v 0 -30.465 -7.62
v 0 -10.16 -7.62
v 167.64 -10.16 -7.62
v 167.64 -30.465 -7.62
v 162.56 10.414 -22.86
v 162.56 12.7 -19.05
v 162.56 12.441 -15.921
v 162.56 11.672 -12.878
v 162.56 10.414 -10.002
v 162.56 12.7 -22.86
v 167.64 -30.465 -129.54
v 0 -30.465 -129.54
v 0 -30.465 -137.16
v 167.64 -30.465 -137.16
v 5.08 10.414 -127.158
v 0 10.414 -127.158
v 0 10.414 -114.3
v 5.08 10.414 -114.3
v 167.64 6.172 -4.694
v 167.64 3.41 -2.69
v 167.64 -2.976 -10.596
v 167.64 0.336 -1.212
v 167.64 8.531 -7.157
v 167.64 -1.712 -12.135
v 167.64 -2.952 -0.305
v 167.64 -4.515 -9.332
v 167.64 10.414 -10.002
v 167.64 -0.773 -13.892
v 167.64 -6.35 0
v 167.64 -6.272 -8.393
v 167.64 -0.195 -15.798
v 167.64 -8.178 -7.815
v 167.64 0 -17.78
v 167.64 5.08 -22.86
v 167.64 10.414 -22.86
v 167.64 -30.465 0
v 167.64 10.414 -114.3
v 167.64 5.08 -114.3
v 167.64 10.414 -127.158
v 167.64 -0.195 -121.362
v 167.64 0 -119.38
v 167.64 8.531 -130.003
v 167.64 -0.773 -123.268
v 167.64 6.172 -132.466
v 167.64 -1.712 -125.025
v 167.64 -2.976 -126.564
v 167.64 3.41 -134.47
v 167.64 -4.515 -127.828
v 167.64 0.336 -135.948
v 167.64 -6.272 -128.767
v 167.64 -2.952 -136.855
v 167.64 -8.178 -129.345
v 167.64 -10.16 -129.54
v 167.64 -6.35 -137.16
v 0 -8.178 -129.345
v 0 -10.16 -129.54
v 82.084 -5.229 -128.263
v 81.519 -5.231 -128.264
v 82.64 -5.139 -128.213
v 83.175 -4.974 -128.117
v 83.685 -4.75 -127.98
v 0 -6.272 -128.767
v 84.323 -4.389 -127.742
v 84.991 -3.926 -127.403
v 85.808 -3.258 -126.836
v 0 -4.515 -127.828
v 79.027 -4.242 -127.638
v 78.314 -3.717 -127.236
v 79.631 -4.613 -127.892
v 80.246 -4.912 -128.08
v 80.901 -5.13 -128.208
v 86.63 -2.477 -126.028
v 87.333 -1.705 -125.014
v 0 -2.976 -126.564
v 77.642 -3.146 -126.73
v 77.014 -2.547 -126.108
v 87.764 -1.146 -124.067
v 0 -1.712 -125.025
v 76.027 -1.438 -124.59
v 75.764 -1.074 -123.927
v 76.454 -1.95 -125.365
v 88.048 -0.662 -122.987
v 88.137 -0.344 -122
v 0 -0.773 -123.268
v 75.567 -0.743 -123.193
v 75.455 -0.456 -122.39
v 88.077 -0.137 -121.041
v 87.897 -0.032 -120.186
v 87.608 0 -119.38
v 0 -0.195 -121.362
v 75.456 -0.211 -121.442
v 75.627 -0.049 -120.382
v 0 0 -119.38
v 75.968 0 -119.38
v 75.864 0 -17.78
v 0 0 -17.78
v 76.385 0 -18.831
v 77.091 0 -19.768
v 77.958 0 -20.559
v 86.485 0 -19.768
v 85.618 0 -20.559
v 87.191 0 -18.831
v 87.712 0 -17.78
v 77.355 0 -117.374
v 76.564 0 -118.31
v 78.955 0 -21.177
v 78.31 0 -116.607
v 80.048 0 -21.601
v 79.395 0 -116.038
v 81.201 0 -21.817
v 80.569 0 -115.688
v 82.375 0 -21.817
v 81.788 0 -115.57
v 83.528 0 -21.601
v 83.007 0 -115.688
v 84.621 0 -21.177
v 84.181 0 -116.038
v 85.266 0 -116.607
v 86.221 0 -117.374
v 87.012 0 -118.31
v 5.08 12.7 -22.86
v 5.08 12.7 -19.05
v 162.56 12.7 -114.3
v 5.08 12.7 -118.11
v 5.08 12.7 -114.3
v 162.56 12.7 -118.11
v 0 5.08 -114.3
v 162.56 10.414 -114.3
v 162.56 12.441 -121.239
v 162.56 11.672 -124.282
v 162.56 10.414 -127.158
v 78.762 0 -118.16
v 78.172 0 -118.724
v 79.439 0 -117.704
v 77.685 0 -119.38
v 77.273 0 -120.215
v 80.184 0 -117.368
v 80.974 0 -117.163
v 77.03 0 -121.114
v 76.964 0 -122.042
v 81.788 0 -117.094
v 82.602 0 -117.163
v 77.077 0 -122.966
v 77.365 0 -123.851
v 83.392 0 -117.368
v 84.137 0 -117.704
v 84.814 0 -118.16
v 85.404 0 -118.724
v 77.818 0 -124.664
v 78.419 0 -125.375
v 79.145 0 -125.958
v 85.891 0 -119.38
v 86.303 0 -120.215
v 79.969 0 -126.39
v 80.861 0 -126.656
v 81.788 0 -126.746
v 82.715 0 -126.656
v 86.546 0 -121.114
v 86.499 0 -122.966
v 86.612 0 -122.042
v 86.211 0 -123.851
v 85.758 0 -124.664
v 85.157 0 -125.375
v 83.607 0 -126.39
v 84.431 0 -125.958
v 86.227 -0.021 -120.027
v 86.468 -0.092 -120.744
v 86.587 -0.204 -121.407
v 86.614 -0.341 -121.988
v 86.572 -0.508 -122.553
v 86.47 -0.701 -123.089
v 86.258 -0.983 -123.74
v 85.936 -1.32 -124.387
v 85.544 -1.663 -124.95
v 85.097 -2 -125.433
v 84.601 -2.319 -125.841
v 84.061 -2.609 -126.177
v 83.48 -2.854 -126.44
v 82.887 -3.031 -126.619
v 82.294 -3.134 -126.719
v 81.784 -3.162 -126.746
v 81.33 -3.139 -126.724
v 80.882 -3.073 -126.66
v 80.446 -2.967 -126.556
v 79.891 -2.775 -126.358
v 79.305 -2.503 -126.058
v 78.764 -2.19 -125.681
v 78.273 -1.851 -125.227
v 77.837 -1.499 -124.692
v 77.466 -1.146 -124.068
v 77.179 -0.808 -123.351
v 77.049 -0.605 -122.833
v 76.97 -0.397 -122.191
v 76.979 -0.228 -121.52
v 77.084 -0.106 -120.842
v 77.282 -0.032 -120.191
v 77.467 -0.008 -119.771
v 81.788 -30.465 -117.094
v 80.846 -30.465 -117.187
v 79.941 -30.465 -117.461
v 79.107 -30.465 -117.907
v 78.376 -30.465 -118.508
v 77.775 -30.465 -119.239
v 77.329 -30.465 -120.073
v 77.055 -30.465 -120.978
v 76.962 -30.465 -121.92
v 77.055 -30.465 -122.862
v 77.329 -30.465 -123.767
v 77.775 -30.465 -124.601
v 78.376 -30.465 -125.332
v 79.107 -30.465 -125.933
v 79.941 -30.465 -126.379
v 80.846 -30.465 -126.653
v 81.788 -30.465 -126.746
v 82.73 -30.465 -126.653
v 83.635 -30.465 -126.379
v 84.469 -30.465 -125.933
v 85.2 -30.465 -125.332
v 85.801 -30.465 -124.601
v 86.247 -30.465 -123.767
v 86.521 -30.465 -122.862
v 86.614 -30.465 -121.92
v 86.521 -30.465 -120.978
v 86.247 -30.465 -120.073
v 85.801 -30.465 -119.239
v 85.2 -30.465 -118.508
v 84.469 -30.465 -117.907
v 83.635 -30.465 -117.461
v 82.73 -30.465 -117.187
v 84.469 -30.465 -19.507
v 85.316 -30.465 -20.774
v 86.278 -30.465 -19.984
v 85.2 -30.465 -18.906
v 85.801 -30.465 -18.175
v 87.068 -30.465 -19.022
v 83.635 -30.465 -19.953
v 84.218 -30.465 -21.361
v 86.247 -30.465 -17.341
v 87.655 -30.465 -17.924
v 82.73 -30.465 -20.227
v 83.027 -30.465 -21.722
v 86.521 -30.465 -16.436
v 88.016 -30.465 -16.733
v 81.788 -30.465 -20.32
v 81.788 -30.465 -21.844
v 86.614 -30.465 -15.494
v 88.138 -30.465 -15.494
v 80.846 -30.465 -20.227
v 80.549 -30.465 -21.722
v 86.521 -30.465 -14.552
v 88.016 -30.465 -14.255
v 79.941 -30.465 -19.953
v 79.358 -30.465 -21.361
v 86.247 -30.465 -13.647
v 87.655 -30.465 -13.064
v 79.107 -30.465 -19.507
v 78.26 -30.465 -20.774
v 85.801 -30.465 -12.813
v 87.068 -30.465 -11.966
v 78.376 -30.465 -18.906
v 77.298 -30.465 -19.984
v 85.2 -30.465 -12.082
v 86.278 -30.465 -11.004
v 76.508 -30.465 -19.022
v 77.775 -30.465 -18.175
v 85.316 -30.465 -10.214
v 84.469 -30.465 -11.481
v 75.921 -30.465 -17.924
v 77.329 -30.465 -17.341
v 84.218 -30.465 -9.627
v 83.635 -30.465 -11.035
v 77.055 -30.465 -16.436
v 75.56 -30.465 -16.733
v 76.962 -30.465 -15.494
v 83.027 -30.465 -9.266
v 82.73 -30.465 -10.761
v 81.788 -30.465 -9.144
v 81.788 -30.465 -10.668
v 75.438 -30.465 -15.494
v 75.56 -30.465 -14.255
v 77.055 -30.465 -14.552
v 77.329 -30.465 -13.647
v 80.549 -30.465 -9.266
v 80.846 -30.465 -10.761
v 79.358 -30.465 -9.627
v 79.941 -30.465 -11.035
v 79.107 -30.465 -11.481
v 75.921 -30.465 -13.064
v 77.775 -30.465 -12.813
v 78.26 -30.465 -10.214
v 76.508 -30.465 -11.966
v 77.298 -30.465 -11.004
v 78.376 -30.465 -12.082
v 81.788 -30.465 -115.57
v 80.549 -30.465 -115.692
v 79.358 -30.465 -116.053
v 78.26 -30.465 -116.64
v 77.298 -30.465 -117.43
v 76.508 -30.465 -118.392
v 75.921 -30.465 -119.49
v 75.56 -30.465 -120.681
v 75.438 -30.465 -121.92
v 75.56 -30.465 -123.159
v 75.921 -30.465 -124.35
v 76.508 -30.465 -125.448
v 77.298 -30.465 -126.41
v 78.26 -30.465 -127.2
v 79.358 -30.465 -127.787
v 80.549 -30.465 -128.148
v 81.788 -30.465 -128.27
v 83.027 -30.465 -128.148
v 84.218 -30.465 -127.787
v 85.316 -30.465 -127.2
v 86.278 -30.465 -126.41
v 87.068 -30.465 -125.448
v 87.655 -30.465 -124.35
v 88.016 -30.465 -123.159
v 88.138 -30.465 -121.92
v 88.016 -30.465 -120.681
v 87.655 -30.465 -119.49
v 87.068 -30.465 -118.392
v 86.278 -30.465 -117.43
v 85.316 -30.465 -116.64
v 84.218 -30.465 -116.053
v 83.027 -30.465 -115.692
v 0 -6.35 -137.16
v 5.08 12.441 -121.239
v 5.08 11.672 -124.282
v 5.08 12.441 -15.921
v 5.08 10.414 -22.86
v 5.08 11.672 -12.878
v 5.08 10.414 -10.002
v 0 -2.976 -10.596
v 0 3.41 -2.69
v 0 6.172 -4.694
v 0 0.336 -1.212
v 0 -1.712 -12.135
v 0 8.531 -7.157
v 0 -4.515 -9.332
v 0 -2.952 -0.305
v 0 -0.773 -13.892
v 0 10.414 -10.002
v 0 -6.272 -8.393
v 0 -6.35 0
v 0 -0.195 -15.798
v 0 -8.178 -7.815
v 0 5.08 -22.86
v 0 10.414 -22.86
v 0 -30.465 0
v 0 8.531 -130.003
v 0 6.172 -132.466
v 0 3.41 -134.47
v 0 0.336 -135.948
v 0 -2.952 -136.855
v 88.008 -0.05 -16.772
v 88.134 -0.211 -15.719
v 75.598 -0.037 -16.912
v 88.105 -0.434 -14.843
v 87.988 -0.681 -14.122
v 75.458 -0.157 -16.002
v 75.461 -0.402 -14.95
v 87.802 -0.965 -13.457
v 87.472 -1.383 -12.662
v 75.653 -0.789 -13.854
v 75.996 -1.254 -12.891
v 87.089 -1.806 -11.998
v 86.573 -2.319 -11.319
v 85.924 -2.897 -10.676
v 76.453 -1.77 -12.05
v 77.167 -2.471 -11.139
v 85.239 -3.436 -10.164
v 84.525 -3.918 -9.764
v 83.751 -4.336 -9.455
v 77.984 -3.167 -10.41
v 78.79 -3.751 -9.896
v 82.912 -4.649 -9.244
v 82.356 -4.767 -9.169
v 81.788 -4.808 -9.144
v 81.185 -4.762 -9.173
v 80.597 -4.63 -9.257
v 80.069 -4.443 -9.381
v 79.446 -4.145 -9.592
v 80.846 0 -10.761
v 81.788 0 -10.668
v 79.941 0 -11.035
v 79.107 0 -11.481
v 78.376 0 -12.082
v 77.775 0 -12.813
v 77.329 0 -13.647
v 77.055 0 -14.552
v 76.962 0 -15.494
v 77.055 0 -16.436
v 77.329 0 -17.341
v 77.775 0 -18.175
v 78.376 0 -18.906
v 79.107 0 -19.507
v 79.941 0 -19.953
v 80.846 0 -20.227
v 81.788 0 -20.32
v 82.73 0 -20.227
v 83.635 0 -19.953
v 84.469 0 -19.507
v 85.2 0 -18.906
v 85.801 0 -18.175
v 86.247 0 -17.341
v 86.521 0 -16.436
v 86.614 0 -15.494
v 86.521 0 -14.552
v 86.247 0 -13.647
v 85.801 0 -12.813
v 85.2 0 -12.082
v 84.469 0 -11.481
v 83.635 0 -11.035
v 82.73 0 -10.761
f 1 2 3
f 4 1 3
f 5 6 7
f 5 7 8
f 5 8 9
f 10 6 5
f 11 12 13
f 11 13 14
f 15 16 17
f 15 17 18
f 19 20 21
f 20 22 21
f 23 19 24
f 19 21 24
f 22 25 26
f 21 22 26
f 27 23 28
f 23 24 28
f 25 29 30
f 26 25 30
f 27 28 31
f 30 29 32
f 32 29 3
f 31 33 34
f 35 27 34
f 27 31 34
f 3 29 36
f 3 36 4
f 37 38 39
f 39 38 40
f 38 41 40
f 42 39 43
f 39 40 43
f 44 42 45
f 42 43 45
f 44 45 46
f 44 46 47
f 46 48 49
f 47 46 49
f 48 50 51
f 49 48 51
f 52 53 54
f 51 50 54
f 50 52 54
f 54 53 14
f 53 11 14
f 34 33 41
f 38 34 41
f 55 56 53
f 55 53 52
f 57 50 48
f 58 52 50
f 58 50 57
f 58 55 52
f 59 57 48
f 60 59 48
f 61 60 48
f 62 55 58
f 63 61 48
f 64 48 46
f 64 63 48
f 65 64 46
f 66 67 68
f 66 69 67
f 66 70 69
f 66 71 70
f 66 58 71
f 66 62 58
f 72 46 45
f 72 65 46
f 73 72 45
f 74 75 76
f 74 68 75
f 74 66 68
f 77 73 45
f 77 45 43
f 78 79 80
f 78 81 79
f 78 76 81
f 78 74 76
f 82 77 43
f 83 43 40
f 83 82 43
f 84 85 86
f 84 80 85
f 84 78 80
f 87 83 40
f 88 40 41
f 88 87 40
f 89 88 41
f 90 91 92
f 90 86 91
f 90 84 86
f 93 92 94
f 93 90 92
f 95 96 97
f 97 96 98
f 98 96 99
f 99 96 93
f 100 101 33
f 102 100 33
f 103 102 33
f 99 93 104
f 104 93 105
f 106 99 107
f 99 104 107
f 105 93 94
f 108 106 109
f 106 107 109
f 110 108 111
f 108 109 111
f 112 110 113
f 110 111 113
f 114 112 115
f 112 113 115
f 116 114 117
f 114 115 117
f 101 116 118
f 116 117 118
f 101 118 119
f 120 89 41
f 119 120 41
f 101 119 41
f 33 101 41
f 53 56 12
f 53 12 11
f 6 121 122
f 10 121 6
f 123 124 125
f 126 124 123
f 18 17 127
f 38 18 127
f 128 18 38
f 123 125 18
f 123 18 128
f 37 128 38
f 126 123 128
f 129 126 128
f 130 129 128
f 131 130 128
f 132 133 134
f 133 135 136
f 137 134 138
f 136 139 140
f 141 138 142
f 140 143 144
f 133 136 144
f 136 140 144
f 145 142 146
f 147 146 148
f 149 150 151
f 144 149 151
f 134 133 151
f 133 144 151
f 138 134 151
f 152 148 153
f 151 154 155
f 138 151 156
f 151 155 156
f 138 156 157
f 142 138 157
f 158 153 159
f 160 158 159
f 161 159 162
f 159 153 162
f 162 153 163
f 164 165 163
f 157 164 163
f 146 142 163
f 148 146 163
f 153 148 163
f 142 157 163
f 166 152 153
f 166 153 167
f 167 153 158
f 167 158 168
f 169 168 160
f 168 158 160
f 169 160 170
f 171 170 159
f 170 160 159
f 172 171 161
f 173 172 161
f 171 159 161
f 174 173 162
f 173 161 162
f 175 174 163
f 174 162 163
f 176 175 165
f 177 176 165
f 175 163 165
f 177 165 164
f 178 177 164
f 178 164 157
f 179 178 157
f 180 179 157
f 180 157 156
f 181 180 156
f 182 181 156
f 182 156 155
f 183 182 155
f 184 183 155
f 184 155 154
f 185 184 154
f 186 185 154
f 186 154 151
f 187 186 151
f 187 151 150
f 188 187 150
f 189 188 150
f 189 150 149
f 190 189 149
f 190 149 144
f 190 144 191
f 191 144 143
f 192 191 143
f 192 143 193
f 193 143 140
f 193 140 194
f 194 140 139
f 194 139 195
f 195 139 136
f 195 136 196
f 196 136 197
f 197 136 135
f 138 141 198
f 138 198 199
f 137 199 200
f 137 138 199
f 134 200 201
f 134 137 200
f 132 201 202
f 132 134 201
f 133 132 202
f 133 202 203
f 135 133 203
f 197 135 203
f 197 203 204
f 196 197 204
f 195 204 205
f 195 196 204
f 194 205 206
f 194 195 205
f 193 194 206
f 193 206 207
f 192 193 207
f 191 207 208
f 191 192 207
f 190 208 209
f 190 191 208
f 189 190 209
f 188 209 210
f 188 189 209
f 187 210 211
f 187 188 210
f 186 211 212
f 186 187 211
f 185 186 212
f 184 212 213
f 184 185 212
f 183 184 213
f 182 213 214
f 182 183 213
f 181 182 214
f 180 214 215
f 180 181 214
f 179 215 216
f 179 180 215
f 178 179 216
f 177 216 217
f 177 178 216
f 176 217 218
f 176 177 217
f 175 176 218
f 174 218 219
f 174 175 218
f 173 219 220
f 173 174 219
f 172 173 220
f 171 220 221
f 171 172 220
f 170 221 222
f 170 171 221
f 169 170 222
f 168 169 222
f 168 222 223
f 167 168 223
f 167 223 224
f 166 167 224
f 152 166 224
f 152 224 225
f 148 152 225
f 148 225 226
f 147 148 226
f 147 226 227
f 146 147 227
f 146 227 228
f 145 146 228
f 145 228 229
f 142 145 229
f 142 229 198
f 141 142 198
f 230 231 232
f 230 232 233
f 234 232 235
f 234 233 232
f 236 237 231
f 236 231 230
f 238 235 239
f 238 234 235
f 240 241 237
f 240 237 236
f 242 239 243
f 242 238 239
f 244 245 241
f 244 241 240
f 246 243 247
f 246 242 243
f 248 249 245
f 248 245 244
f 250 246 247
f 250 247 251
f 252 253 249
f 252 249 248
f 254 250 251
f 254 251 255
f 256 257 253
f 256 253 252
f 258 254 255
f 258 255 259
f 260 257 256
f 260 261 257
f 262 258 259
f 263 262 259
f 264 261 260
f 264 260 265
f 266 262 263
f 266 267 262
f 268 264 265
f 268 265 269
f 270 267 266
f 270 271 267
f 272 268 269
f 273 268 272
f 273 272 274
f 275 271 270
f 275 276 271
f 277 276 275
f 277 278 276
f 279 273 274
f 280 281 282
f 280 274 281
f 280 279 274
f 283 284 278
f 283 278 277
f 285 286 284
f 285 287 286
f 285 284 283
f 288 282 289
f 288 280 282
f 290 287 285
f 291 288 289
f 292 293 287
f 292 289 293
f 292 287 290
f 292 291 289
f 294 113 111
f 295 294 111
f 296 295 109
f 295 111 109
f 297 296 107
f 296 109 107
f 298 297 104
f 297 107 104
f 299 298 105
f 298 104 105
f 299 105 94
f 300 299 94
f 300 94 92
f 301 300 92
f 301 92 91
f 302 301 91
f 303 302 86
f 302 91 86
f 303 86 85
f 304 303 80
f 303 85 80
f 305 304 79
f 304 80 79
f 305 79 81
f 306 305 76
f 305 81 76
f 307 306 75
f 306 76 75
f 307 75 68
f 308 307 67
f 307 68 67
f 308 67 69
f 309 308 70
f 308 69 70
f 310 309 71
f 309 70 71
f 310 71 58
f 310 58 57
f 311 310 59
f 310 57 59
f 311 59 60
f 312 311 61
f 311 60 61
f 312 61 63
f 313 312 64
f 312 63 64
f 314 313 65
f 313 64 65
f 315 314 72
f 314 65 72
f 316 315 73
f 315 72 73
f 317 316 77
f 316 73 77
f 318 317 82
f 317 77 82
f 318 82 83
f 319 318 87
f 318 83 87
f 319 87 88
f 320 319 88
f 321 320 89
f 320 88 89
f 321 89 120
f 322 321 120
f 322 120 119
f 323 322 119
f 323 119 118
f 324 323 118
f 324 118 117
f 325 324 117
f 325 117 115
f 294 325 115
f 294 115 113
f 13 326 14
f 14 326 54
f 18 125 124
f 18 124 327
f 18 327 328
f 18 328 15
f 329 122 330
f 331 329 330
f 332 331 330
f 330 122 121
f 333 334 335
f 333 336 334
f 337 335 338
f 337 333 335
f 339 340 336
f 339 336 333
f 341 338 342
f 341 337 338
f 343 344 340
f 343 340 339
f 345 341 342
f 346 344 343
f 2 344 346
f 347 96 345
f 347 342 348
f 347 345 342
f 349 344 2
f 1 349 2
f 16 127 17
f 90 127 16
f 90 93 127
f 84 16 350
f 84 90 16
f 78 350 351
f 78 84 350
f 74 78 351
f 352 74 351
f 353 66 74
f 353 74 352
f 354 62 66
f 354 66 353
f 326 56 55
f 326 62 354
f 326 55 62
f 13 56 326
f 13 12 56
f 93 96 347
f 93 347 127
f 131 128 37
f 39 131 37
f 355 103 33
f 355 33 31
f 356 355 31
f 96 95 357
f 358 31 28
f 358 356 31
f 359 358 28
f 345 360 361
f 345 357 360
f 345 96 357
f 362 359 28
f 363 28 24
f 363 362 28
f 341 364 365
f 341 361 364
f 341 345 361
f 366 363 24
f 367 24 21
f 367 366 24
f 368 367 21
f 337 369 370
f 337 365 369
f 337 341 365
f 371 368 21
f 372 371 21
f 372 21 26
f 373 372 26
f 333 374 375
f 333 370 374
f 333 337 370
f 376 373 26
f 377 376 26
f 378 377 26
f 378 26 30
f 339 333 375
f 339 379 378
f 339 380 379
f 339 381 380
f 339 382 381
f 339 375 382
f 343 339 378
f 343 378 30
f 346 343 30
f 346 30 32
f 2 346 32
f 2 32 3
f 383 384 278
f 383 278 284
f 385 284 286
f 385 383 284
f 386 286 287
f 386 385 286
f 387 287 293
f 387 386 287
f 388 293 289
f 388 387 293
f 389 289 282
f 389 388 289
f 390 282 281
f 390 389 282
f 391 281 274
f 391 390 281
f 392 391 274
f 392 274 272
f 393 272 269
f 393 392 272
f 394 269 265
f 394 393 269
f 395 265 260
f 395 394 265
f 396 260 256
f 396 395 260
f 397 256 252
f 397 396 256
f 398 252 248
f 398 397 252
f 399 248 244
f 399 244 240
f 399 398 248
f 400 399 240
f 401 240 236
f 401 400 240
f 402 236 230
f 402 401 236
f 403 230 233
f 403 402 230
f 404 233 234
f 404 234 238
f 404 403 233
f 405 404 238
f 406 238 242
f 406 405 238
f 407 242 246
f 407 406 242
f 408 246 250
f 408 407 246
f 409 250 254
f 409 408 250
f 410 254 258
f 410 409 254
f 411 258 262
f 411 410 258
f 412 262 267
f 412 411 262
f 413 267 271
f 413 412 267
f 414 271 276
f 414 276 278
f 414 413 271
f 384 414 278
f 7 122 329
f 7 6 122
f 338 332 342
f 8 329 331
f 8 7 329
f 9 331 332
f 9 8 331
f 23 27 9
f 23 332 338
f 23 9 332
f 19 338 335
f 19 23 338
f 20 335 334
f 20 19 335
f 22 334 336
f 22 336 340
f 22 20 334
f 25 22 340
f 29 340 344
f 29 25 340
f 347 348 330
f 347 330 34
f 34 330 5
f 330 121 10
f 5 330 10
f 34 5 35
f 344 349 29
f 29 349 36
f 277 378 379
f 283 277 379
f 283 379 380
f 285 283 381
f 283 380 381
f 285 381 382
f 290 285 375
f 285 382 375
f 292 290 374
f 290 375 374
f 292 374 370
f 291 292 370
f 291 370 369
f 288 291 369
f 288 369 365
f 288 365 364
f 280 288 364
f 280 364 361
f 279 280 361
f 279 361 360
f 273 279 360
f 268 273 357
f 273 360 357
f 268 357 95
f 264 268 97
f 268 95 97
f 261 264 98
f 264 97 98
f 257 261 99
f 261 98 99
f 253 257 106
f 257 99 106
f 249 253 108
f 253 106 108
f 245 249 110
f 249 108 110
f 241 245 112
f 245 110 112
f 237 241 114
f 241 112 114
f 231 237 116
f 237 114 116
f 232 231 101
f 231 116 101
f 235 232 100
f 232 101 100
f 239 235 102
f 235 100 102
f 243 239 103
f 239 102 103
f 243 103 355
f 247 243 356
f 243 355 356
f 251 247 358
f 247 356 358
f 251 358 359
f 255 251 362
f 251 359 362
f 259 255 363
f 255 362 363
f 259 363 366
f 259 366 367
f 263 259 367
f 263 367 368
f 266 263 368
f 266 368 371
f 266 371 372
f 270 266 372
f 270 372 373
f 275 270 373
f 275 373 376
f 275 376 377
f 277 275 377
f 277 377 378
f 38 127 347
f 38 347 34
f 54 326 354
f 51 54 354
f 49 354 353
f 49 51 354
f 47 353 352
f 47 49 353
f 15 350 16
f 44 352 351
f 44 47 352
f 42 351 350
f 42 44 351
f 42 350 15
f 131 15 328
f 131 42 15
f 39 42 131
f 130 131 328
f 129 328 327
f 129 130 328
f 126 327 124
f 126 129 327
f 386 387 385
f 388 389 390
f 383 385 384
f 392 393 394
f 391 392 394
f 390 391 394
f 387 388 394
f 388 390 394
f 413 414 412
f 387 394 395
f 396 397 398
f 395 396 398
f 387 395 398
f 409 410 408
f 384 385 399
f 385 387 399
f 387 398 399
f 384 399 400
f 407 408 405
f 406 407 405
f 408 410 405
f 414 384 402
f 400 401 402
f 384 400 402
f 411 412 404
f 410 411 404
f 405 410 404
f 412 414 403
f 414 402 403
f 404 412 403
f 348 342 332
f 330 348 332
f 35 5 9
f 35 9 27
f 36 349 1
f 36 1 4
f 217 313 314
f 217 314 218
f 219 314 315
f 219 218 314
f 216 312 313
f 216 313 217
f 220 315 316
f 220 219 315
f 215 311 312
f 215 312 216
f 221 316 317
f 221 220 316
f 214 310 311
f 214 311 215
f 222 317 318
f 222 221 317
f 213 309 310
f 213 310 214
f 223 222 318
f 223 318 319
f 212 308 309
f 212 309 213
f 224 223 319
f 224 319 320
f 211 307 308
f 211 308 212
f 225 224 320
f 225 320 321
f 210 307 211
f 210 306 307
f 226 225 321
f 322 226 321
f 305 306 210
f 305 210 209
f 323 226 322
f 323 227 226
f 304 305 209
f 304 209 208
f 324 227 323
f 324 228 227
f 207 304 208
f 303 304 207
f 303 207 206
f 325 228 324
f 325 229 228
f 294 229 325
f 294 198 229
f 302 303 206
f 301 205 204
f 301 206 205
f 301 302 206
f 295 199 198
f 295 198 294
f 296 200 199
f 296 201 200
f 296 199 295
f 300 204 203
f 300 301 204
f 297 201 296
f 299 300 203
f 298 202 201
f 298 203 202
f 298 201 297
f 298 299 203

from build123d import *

# Parameters (mm, degrees)
SKETCH1_W           = 167.64
SKETCH1_H           = 137.16
BOSS_EXTRUDE1_DEPTH = 12.7
SKETCH2_W           = 167.64
SKETCH2_H           = 91.44
CUT_EXTRUDE1_DEPTH  = 7.62
SKETCH3_W           = 5.08
SKETCH3_H           = 22.86
CUT_EXTRUDE2_DEPTH  = 2.286
SKETCH4_R           = 6.35
SKETCH4_R_2         = 4.826
BOSS_EXTRUDE2_DEPTH = 30.464799878
SKETCH5_W           = 167.64
SKETCH5_H           = 7.62
BOSS_EXTRUDE3_DEPTH = 30.464799878
FILLET1_R           = 19.05
FILLET2_R           = 10.16


with BuildPart() as part:
    # Sketch1 → Boss-Extrude1 (new body)
    with BuildSketch(Plane(origin=(0, 0, 0), x_dir=(1, 0, 0), z_dir=(0, 1, 0))):
        with Locations((83.82, 68.58)):
            Rectangle(SKETCH1_W, SKETCH1_H)
    extrude(amount=BOSS_EXTRUDE1_DEPTH)

    # Sketch2 → Cut-Extrude1 (cut)
    with BuildSketch(Plane(origin=(0, 12.7, 0), x_dir=(1, 0, 0), z_dir=(0, 1, 0))):
        with Locations((83.82, 68.58)):
            Rectangle(SKETCH2_W, SKETCH2_H)
    extrude(amount=-CUT_EXTRUDE1_DEPTH, mode=Mode.SUBTRACT)

    # Sketch3 → Cut-Extrude2 (cut)
    with BuildSketch(Plane(origin=(0, 12.7, 0), x_dir=(1, 0, 0), z_dir=(0, 1, 0))):
        with Locations((2.54, 125.73)):
            Rectangle(SKETCH3_W, SKETCH3_H)
        with Locations((165.1, 125.73)):
            Rectangle(SKETCH3_W, SKETCH3_H)
        with Locations((165.1, 11.43)):
            Rectangle(SKETCH3_W, SKETCH3_H)
        with Locations((2.54, 11.43)):
            Rectangle(SKETCH3_W, SKETCH3_H)
    extrude(amount=-CUT_EXTRUDE2_DEPTH, mode=Mode.SUBTRACT)

    # Sketch4 → Boss-Extrude2 (add)
    # profile 1 of 2: a face of its own
    with BuildSketch(Plane.XZ):
        with Locations(Location((81.788, -15.494, 0), (0, 0, 90))):
            Circle(SKETCH4_R)
        with Locations(Location((81.788, -15.494, 0), (0, 0, 90))):
            Circle(SKETCH4_R_2, mode=Mode.SUBTRACT)
    # profile 2 of 2: a face of its own
    with BuildSketch(Plane.XZ):
        with Locations(Location((81.788, -121.92, 0), (0, 0, 90))):
            Circle(SKETCH4_R)
        with Locations(Location((81.788, -121.92, 0), (0, 0, 90))):
            Circle(SKETCH4_R_2, mode=Mode.SUBTRACT)
    extrude(amount=BOSS_EXTRUDE2_DEPTH)

    # Sketch5 → Boss-Extrude3 (add)
    with BuildSketch(Plane.XZ):
        with Locations((83.82, -133.35)):
            Rectangle(SKETCH5_W, SKETCH5_H)
        with Locations((83.82, -3.81)):
            Rectangle(SKETCH5_W, SKETCH5_H)
    extrude(amount=BOSS_EXTRUDE3_DEPTH)

    # Fillet1
    fillet1_edges = [part.edges().sort_by_distance(p)[0] for p in [
        (83.82, 12.7, 0),
        (83.82, 12.7, -137.16),
    ]]
    fillet(fillet1_edges, radius=FILLET1_R)

    # Fillet2
    # the kernel refuses this fillet: 10.16 mm, written as the material it adds along each edge
    with BuildSketch(Plane(origin=(0, 0, -7.62), x_dir=(0, -1, 0), z_dir=(1, 0, 0))) as fillet2_piece_1_section:
        with BuildLine():
            CenterArc((FILLET2_R, FILLET2_R), FILLET2_R, 180, 90)
            Line((0, FILLET2_R), (0, 0))
            Line((0, 0), (FILLET2_R, 0))
        make_face()
    fillet2_piece_1 = extrude(amount=167.64, mode=Mode.PRIVATE)
    fillet2_piece_1 = fillet2_piece_1 - Plane(origin=(81.788, -7.490679749, -15.494), x_dir=(0, 0, 1), z_dir=(0, 1, 0)) * Cylinder(4.826, 376, mode=Mode.PRIVATE)
    add(fillet2_piece_1)
    with BuildSketch(Plane(origin=(0, 0, -129.54), x_dir=(0, 0, 1), z_dir=(1, 0, 0))) as fillet2_piece_2_section:
        with BuildLine():
            CenterArc((FILLET2_R, FILLET2_R), FILLET2_R, 180, 90)
            Line((0, FILLET2_R), (0, 0))
            Line((0, 0), (FILLET2_R, 0))
        make_face()
    fillet2_piece_2 = extrude(amount=167.64, mode=Mode.PRIVATE)
    fillet2_piece_2 = fillet2_piece_2 - Plane(origin=(81.788, -0.198114481, -121.92), x_dir=(0, 0, 1), z_dir=(0, 1, 0)) * Cylinder(4.826, 376, mode=Mode.PRIVATE)
    add(fillet2_piece_2)


solid = part.part
